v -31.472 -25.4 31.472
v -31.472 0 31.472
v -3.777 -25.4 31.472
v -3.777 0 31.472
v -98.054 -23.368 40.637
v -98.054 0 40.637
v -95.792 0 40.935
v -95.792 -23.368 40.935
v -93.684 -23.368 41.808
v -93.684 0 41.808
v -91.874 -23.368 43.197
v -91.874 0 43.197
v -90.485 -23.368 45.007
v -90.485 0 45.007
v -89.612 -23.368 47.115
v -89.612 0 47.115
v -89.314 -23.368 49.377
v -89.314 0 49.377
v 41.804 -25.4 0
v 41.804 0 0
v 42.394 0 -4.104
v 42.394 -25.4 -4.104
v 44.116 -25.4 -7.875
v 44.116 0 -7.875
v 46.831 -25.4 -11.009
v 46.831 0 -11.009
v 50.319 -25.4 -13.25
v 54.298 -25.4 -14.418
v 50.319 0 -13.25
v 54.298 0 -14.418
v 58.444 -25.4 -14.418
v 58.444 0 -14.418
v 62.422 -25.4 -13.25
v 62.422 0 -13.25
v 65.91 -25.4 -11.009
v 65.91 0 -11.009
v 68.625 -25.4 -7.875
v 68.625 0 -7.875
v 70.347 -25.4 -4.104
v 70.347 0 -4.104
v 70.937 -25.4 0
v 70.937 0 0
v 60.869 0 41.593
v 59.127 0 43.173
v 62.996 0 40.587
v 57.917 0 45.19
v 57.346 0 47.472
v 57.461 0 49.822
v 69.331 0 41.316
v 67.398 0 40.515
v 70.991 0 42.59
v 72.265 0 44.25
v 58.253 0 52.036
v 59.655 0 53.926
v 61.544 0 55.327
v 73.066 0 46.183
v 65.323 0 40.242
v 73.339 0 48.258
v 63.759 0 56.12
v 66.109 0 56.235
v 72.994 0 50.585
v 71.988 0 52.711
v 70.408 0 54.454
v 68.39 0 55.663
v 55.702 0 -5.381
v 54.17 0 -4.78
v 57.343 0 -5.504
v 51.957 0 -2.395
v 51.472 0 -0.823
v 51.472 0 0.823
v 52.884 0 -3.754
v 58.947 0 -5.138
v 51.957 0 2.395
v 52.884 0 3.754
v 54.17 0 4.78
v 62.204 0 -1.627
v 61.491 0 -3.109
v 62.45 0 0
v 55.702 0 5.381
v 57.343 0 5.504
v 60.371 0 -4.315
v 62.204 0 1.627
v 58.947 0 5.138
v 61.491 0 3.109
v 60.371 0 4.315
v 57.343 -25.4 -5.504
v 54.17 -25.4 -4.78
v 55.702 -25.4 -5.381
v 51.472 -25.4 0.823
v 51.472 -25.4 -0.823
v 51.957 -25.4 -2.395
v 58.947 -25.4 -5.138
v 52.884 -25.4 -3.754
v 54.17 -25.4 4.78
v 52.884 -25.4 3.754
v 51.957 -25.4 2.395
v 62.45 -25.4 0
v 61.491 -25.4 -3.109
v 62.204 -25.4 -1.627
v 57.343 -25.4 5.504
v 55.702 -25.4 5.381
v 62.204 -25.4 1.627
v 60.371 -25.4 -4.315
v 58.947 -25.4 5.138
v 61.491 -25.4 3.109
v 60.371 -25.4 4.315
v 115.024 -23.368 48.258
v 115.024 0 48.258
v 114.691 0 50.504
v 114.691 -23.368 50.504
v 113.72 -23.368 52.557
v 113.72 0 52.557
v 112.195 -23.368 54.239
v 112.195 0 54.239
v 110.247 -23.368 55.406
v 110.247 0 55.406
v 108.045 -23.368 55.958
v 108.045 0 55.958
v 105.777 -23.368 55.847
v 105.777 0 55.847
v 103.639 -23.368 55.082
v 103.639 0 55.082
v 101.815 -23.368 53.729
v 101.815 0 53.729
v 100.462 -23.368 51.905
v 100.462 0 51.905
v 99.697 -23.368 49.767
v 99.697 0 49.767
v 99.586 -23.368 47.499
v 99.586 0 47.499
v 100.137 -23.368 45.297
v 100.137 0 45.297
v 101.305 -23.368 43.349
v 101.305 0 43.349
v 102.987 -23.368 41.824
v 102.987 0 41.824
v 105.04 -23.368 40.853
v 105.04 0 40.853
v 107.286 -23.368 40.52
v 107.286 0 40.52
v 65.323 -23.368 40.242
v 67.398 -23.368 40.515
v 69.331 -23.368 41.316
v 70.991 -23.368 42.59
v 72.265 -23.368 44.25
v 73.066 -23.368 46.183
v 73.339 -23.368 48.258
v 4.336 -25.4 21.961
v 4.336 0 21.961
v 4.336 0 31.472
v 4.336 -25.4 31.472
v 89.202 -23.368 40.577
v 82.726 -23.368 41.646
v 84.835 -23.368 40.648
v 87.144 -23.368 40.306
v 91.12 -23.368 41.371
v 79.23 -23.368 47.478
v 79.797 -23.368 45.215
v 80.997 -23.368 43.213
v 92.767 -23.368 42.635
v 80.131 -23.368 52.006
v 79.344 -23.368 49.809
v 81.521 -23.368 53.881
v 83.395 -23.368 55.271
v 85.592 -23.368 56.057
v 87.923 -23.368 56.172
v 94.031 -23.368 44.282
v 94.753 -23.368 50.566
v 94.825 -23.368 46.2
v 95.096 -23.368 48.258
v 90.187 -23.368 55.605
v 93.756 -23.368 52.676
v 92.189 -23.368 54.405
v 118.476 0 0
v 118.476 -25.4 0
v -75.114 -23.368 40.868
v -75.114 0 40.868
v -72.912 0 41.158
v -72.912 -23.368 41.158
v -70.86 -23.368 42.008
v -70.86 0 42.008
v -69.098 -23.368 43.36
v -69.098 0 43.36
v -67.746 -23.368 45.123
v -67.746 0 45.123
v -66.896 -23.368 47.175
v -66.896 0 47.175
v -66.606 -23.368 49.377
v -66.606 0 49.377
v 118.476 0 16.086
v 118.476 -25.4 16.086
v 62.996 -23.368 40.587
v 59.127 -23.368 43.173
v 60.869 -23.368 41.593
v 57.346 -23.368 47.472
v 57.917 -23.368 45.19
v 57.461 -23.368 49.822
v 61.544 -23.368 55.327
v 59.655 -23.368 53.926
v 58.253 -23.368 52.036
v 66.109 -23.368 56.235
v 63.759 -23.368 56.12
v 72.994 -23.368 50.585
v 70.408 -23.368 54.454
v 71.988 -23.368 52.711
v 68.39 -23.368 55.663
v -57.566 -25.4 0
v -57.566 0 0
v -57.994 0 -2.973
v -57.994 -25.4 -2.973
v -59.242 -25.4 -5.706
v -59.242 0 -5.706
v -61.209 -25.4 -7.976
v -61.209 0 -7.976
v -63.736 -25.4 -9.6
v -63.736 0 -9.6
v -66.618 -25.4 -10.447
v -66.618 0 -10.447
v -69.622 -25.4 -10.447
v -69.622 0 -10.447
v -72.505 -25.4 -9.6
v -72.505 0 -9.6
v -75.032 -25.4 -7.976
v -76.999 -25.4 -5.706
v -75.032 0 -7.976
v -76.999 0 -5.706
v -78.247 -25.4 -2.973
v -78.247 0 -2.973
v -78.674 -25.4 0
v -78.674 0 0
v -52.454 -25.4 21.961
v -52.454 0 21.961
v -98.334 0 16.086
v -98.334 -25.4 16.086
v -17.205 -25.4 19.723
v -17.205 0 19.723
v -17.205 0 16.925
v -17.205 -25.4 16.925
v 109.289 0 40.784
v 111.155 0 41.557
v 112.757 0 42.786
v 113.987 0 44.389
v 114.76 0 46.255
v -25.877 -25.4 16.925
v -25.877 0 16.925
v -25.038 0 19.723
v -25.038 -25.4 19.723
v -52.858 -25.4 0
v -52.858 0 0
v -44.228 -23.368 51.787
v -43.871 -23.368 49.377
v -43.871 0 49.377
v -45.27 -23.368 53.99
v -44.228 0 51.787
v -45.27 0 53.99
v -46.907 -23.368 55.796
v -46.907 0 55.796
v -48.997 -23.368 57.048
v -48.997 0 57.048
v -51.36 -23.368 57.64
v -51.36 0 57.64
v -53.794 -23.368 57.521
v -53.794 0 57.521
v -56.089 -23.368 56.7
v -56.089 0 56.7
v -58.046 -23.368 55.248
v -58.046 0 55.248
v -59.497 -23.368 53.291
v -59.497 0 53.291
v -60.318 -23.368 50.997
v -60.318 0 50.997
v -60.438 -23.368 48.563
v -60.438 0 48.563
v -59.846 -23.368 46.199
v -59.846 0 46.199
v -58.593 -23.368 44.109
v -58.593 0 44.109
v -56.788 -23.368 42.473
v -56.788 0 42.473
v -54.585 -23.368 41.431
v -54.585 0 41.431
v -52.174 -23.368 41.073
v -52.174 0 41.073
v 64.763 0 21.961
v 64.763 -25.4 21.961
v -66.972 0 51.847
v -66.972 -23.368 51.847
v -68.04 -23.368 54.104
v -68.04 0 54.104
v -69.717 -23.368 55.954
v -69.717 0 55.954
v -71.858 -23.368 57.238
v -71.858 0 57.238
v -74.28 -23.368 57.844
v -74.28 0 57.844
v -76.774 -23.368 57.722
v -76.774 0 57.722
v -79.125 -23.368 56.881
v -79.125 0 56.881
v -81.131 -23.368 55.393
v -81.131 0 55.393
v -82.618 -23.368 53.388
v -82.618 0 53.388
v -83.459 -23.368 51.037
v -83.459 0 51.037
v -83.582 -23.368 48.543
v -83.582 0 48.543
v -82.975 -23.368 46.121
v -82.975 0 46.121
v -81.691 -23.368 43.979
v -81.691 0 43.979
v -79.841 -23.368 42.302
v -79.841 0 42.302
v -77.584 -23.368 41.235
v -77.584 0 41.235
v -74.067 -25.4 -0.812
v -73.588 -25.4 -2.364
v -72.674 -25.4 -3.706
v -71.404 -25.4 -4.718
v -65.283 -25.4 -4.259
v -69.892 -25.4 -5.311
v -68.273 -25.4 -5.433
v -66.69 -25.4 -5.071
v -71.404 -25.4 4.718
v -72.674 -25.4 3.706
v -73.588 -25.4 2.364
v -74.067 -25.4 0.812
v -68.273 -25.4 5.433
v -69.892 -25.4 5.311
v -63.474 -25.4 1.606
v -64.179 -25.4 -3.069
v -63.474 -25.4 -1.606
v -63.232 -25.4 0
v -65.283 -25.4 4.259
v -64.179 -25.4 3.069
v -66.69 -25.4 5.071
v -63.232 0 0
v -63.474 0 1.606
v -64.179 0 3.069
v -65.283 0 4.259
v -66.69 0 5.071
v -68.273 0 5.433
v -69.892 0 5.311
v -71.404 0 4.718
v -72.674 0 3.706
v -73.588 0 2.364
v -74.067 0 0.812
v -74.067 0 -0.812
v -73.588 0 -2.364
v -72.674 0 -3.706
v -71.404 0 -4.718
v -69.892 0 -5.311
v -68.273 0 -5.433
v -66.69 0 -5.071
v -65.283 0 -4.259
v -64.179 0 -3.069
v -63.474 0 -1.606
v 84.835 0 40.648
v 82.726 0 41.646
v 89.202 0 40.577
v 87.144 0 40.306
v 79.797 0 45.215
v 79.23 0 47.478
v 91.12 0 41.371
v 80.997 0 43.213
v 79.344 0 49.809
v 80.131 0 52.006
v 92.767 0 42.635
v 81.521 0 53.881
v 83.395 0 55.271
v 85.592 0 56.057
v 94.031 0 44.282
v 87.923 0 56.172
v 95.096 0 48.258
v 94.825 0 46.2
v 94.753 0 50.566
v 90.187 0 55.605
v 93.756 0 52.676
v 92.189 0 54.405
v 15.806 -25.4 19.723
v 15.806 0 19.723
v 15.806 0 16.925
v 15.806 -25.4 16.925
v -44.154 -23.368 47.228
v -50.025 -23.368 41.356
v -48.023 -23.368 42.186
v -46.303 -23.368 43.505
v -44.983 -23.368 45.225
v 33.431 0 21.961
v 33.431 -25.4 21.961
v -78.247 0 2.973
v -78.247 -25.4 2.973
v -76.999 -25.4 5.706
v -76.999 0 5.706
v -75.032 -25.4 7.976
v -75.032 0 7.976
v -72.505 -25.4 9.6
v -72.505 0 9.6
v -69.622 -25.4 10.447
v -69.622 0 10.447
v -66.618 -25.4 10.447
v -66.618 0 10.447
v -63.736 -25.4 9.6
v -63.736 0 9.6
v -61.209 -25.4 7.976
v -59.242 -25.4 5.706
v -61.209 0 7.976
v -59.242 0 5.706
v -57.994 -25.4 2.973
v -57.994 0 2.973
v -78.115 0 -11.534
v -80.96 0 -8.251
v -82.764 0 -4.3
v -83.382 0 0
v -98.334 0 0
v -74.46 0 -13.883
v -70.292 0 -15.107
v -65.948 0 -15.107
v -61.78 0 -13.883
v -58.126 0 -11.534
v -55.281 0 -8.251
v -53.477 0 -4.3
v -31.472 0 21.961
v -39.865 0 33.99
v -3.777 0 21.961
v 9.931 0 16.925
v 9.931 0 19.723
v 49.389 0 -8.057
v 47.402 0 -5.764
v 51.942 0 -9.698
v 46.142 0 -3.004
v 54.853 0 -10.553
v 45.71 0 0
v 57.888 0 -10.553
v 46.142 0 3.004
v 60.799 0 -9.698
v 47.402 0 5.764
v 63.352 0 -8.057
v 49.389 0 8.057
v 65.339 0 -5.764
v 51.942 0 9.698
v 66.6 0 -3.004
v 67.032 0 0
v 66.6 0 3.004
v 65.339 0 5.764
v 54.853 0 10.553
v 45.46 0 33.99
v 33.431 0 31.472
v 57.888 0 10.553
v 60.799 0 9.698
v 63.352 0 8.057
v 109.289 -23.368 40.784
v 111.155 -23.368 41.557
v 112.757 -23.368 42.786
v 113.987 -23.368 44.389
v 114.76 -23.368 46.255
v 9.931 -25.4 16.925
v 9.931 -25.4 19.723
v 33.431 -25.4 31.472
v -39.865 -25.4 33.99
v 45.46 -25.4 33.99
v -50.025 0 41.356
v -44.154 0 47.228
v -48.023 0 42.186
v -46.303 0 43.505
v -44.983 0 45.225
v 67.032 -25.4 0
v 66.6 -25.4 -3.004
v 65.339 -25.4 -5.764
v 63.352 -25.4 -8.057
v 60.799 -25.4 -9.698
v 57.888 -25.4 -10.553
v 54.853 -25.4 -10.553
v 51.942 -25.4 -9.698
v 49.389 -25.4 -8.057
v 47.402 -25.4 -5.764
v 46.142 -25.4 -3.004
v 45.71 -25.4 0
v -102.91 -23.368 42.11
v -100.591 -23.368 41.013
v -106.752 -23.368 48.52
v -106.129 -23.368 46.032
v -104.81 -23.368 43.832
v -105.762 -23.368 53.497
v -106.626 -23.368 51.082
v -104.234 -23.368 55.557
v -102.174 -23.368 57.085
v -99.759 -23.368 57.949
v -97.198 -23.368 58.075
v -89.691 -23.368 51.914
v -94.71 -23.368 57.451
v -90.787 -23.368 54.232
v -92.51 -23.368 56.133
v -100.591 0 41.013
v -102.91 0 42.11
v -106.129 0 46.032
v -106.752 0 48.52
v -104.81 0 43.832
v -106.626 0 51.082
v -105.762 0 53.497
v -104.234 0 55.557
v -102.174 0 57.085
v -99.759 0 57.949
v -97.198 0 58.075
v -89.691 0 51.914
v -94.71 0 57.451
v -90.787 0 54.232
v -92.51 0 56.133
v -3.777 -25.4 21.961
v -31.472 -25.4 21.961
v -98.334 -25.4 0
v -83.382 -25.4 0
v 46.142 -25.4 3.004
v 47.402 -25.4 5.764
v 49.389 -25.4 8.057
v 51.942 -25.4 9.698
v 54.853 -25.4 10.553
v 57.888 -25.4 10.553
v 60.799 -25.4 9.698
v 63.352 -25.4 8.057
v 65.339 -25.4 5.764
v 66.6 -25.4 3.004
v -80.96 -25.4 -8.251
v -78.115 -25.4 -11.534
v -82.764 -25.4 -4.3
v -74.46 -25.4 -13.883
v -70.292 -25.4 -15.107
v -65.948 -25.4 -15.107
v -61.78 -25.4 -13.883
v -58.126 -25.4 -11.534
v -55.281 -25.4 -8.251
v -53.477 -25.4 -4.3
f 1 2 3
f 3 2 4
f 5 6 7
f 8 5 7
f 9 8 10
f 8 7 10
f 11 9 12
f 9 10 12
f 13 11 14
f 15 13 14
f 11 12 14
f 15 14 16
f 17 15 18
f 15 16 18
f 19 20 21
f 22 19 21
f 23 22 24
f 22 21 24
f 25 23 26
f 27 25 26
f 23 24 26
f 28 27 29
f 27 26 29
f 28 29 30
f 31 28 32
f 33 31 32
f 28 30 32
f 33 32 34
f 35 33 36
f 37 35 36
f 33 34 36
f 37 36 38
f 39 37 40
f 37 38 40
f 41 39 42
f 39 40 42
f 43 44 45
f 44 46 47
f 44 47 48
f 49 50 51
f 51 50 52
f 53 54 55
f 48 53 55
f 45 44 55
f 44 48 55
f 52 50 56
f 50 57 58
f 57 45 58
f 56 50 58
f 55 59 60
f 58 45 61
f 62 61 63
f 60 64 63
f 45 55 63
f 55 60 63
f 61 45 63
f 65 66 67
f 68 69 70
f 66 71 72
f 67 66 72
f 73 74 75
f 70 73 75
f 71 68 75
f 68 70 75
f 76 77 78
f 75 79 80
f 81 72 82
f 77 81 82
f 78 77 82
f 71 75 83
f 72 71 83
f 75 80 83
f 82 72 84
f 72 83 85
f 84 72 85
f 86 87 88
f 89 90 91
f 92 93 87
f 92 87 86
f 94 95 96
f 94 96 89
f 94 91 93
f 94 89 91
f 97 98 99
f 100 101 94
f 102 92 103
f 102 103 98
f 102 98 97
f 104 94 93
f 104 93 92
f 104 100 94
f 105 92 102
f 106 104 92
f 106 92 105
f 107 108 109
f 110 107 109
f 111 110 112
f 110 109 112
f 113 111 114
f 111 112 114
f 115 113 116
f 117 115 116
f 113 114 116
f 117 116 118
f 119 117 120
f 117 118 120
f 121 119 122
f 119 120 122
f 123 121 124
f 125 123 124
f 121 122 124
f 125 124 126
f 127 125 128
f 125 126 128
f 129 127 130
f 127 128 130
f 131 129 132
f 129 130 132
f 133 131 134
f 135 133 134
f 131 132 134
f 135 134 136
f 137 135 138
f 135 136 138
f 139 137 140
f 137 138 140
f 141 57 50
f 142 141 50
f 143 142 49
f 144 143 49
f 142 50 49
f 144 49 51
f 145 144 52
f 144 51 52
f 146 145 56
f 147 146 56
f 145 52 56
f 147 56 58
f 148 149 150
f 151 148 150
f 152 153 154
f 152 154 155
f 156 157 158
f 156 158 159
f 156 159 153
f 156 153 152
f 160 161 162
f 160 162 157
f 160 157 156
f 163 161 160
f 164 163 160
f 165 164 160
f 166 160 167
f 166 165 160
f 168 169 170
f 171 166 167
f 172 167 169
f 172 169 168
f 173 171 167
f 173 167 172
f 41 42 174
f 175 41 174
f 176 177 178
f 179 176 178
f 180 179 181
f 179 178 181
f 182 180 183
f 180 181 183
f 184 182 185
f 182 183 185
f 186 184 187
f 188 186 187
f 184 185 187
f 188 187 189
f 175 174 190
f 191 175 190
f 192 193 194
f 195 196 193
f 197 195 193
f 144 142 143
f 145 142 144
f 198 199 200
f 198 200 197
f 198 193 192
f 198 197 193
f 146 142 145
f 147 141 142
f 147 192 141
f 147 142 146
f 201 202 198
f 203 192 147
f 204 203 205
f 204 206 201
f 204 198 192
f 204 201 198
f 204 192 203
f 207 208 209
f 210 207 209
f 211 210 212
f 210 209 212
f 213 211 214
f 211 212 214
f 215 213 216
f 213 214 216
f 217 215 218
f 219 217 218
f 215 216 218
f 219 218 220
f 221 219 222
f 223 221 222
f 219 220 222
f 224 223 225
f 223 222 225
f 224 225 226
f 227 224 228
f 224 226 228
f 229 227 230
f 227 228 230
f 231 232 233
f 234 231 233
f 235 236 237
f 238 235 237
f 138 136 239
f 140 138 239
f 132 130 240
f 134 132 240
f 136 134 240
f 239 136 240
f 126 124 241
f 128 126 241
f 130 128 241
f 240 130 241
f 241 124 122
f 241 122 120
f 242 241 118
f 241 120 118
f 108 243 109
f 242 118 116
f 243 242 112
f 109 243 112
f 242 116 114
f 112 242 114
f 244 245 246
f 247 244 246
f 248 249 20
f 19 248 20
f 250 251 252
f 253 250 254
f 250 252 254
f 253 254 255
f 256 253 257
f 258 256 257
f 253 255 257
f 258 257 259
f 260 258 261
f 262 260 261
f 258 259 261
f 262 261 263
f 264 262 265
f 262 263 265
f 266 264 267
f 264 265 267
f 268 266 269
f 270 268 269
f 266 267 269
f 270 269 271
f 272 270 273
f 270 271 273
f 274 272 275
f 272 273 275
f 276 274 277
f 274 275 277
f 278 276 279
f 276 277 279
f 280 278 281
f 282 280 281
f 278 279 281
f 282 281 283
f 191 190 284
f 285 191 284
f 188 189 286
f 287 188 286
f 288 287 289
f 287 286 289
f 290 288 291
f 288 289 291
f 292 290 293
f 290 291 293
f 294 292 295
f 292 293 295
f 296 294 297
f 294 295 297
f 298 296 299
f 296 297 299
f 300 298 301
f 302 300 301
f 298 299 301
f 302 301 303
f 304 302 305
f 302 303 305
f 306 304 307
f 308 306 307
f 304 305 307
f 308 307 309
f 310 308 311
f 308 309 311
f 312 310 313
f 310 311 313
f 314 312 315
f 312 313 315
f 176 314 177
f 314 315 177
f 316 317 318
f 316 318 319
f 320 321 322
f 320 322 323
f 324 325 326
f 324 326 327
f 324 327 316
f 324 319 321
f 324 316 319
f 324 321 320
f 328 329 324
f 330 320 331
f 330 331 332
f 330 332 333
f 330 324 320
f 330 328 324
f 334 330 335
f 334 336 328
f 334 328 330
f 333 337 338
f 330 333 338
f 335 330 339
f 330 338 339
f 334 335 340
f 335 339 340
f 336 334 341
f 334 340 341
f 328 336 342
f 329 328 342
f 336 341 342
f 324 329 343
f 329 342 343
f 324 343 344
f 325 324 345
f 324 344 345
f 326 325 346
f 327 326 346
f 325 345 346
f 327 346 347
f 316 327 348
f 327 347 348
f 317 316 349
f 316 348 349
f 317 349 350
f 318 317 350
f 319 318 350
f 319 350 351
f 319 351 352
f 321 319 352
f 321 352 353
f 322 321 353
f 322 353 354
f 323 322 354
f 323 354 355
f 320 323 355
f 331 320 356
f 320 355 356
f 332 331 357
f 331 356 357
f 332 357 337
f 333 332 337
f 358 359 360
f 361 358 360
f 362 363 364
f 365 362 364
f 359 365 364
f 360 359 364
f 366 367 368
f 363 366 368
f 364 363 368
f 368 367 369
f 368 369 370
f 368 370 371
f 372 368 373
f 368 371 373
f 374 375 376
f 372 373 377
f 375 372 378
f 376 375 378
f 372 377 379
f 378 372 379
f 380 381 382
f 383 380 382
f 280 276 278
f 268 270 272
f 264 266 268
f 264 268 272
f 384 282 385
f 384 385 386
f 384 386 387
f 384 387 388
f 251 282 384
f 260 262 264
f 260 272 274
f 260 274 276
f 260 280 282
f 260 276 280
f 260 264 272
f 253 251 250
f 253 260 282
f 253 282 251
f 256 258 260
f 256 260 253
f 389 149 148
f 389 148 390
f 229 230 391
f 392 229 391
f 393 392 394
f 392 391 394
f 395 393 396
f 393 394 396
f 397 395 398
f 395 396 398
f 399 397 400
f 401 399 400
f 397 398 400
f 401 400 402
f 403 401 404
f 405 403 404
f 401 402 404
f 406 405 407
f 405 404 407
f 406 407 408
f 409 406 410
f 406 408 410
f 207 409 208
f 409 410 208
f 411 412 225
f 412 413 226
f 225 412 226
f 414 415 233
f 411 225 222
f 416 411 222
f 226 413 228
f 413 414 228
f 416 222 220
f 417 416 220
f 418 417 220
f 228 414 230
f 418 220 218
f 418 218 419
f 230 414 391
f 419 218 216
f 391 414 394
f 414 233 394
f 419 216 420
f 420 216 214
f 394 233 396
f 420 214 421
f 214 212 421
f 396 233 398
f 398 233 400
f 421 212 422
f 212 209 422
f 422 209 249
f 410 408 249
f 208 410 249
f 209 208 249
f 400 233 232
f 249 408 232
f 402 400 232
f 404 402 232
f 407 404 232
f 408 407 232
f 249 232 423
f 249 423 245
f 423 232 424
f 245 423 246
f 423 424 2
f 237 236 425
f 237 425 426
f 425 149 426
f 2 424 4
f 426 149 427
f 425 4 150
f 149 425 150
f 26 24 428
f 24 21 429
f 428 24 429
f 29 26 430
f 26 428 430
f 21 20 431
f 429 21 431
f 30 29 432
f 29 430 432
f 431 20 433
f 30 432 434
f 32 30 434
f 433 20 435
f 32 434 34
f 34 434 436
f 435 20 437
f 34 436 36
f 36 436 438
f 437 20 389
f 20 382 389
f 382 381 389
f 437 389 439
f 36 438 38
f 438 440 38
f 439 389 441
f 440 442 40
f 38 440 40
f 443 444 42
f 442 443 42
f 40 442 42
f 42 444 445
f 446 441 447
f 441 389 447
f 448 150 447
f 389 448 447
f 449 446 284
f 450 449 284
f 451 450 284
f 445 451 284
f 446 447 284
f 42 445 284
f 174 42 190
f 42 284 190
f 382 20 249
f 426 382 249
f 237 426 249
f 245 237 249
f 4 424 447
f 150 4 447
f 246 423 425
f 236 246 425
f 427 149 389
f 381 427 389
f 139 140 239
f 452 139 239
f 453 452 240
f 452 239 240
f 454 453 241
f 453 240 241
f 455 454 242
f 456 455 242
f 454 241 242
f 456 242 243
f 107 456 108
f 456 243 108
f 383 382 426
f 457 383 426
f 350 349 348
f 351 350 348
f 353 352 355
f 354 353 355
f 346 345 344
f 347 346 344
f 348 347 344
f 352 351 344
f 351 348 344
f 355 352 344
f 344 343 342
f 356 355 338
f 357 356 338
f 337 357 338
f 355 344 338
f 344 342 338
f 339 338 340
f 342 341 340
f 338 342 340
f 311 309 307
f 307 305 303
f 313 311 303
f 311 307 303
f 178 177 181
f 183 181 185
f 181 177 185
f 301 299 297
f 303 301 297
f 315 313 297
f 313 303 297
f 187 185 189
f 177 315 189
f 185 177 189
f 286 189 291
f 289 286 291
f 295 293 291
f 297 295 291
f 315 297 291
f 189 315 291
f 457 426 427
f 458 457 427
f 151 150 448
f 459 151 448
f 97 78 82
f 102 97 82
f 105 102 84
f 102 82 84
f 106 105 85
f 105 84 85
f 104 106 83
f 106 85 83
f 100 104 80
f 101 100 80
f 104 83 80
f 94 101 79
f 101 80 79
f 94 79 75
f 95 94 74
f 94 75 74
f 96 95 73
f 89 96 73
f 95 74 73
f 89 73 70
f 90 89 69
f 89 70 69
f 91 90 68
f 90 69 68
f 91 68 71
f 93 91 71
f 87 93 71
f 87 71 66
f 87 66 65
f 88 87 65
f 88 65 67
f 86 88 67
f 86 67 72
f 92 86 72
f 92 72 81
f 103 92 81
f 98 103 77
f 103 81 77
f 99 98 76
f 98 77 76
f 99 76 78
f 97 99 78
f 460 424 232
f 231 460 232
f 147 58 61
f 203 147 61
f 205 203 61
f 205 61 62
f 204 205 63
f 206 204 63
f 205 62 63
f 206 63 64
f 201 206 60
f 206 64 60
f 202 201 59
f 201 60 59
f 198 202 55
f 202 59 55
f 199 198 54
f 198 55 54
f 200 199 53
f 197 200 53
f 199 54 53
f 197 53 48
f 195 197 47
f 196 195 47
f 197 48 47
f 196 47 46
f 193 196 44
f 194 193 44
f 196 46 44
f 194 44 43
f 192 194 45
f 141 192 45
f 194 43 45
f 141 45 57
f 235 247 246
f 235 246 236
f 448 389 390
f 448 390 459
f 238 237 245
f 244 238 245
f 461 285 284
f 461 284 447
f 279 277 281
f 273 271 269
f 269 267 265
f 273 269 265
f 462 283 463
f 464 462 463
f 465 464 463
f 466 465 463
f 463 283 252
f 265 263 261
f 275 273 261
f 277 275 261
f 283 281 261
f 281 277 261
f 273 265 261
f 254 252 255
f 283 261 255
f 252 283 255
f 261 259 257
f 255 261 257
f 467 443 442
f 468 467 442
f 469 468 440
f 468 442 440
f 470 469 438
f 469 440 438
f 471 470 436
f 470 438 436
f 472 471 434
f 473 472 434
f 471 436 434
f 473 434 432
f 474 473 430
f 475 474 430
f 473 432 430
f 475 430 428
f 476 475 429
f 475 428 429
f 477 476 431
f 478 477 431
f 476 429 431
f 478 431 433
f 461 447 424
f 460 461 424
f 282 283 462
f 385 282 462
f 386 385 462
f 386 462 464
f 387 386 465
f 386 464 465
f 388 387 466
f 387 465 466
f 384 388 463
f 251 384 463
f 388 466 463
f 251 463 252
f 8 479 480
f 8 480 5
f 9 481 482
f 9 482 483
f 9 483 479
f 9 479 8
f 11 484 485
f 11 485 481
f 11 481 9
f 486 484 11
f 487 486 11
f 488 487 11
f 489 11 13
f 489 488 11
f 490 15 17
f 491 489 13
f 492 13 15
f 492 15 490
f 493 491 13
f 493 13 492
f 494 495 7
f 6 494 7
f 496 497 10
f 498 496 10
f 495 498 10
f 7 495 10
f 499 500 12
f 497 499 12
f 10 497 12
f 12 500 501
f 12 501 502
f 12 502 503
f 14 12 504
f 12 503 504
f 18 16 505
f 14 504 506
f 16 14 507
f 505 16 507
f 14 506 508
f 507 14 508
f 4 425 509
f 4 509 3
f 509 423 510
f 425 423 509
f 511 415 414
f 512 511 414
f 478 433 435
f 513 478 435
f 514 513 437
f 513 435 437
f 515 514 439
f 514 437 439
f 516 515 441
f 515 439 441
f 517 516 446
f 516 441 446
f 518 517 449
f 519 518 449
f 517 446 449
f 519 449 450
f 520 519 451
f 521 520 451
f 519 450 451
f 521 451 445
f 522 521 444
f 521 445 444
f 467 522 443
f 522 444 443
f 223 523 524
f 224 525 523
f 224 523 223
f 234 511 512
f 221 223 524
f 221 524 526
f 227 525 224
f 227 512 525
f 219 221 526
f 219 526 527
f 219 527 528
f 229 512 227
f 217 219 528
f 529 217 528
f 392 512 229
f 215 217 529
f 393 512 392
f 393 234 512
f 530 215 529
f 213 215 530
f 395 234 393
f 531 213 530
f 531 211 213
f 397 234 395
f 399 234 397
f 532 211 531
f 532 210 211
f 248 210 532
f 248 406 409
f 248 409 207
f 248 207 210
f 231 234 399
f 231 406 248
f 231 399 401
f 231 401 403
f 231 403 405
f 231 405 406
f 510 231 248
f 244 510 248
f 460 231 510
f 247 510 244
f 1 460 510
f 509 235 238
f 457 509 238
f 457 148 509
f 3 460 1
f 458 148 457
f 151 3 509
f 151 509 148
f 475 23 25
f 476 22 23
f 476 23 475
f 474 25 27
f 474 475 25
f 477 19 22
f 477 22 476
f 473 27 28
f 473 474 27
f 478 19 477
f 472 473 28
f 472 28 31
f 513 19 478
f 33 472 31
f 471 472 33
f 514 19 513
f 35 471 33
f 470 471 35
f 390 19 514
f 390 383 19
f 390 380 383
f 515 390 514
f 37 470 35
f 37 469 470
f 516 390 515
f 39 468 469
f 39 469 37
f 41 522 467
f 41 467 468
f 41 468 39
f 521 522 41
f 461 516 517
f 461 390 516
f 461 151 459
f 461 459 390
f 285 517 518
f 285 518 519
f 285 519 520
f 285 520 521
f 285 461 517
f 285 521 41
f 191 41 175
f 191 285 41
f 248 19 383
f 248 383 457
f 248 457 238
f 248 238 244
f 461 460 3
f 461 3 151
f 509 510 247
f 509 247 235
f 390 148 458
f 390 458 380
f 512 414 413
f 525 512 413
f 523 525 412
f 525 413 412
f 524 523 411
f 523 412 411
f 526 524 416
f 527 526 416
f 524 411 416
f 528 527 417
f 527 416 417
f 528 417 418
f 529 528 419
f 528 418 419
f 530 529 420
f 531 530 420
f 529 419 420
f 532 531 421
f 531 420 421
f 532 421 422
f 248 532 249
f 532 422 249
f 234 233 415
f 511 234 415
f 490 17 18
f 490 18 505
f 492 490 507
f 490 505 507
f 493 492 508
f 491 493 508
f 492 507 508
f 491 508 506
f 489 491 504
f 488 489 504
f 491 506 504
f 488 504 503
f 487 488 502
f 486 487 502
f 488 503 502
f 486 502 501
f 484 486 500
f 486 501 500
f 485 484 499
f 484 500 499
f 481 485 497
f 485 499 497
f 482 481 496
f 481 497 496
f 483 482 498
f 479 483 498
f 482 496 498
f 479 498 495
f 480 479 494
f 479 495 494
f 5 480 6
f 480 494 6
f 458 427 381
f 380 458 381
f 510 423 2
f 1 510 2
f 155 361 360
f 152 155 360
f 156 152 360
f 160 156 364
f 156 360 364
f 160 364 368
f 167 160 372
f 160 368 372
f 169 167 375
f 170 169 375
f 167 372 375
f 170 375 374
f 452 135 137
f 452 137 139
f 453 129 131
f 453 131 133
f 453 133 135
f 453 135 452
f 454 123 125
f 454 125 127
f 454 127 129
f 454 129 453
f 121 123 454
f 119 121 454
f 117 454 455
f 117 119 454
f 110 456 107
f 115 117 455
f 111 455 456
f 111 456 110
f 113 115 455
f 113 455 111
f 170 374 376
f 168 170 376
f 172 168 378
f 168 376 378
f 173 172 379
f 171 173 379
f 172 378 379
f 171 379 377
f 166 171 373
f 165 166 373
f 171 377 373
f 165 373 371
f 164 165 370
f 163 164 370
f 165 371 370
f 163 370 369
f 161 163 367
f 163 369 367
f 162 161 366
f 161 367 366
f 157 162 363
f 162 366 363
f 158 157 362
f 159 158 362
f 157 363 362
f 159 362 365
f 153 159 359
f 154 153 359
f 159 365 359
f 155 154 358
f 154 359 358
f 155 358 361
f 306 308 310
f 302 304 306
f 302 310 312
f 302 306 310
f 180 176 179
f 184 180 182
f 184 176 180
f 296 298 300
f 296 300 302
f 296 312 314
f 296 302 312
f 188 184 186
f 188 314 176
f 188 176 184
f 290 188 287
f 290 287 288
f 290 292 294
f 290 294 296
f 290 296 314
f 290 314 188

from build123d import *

# Parameters (mm, degrees)
F0_W     = 27.6957710739
F0_H     = 9.5116812736
F0_W_2   = 29.0945479646
F1_DEPTH = 25.4
F2_R     = 5.4480518547
F3_DEPTH = 25.4
F2_R_2   = 5.5194090988
F5_DEPTH = 23.368


with BuildPart() as f1:
    # F0 (on Front) → F1 (new body)
    with BuildSketch(Plane.XZ):
        with BuildLine():
            Line((-52.8583483225, 0), (0, 0))
            Line((0, 0), (41.8039302109, 0))
            ThreePointArc((41.8039302109, 0), (56.3706867397, 14.5667565288), (70.9374432684, 0))
            Line((70.9374432684, 0), (118.4763461351, 0))
            Line((118.4763461351, 0), (118.4763461351, 16.0859264433))
            Line((118.4763461351, 16.0859264433), (64.7633373737, 21.9607856125))
            Line((64.7633373737, 21.9607856125), (45.4602278769, 33.9902602136))
            Line((45.4602278769, 33.9902602136), (-39.8651212454, 33.9902602136))
            Line((-39.8651212454, 33.9902602136), (-52.454110235, 21.9607856125))
            Line((-52.454110235, 21.9607856125), (-98.3339697123, 16.0859264433))
            Line((-98.3339697123, 16.0859264433), (-98.3339697123, 0))
            Line((-98.3339697123, 0), (-83.3824618334, 0))
            ThreePointArc((-83.3824618334, 0), (-68.1204050779, 15.2620567555), (-52.8583483225, 0))
        make_face()
        Polygon((-21.1215214804, 16.9251933694), (-25.8773602545, 16.9251933694), (-25.0380951911, 19.7227448225), (-21.1215214804, 19.7227448225), (-17.2049477696, 19.7227448225), (-17.2049477696, 16.9251933694), align=None, mode=Mode.SUBTRACT)
        with Locations((-17.6245813491, 26.7166262493)):
            Rectangle(F0_W, F0_H, mode=Mode.SUBTRACT)
        Polygon((12.8687415272, 16.9251933694), (9.9313110113, 16.9251933694), (9.9313110113, 19.7227448225), (12.8687415272, 19.7227448225), (15.8061720431, 19.7227448225), (15.8061720431, 16.9251933694), align=None, mode=Mode.SUBTRACT)
        with Locations((18.8834811561, 26.7166262493)):
            Rectangle(F0_W_2, F0_H, mode=Mode.SUBTRACT)
        with BuildLine():
            ThreePointArc((-83.3824618334, 0), (-68.1204050779, -15.2620567555), (-52.8583483225, 0))
            Line((-52.8583483225, 0), (-57.5663627858, 0))
            ThreePointArc((-57.5663627858, 0), (-68.1204050779, -10.5540422922), (-78.6744473701, 0))
            Line((-78.6744473701, 0), (-83.3824618334, 0))
        make_face()
        with BuildLine():
            Line((-57.5663627858, 0), (-52.8583483225, 0))
            ThreePointArc((-52.8583483225, 0), (-68.1204050779, 15.2620567555), (-83.3824618334, 0))
            Line((-83.3824618334, 0), (-78.6744473701, 0))
            ThreePointArc((-78.6744473701, 0), (-68.1204050779, 10.5540422922), (-57.5663627858, 0))
        make_face()
        with BuildLine():
            ThreePointArc((70.9374432684, 0), (56.3706867397, 14.5667565288), (41.8039302109, 0))
            Line((41.8039302109, 0), (45.7096665583, 0))
            ThreePointArc((45.7096665583, 0), (56.3706867397, 10.6610201813), (67.031706921, 0))
            Line((67.031706921, 0), (70.9374432684, 0))
        make_face()
        with BuildLine():
            Line((45.7096665583, 0), (41.8039302109, 0))
            ThreePointArc((41.8039302109, 0), (56.3706867397, -14.5667565288), (70.9374432684, 0))
            Line((70.9374432684, 0), (67.031706921, 0))
            ThreePointArc((67.031706921, 0), (56.3706867397, -10.6610201813), (45.7096665583, 0))
        make_face()
    extrude(amount=F1_DEPTH)


with BuildPart() as f3:
    # F2 (on Front) → F3 (new body)
    with BuildSketch(Plane.XZ):
        with Locations((-68.6799138784, 0)):
            Circle(F2_R)
    extrude(amount=F3_DEPTH)


with BuildPart() as f3b:
    # F2 (on Front) → F3, piece 2 (new body)
    with BuildSketch(Plane.XZ):
        with Locations((56.9301955402, 0)):
            Circle(F2_R_2)
    extrude(amount=F3_DEPTH)


with BuildPart() as f5:
    # F4 (on Front) → F5 (new body)
    with BuildSketch(Plane.XZ):
        with BuildLine():
            ThreePointArc((65.3228461742, 40.2419242431), (70.9909116632, 42.589713841), (73.3387012612, 48.25777933))
            ThreePointArc((73.3387012612, 48.25777933), (59.6547806852, 53.925844819), (65.3228461742, 40.2419242431))
        make_face()
    extrude(amount=F5_DEPTH)


with BuildPart() as f5b:
    # F4 (on Front) → F5, piece 2 (new body)
    with BuildSketch(Plane.XZ):
        with BuildLine():
            ThreePointArc((-52.1743558347, 41.0732052454), (-46.3028272114, 43.505272033), (-43.8707604238, 49.3768006563))
            ThreePointArc((-43.8707604238, 49.3768006563), (-58.045884458, 55.2483292796), (-52.1743558347, 41.0732052454))
        make_face()
    extrude(amount=F5_DEPTH)


with BuildPart() as f5c:
    # F4 (on Front) → F5, piece 3 (new body)
    with BuildSketch(Plane.XZ):
        with BuildLine():
            ThreePointArc((-75.1142799854, 40.8683843656), (-69.0979211291, 43.3604418), (-66.6058636947, 49.3768006563))
            ThreePointArc((-66.6058636947, 49.3768006563), (-81.1306388418, 55.3931595127), (-75.1142799854, 40.8683843656))
        make_face()
    extrude(amount=F5_DEPTH)


with BuildPart() as f5d:
    # F4 (on Front) → F5, piece 4 (new body)
    with BuildSketch(Plane.XZ):
        with BuildLine():
            ThreePointArc((-98.054215312, 40.6369699519), (-91.8742217545, 43.1968070988), (-89.3143846076, 49.3768006563))
            ThreePointArc((-89.3143846076, 49.3768006563), (-104.2342088695, 55.5567942138), (-98.054215312, 40.6369699519))
        make_face()
    extrude(amount=F5_DEPTH)


with BuildPart() as f5e:
    # F4 (on Front) → F5, piece 5 (new body)
    with BuildSketch(Plane.XZ):
        with BuildLine():
            ThreePointArc((87.1437564492, 40.3056413085), (92.7667671692, 42.6347686101), (95.0958944708, 48.25777933))
            ThreePointArc((95.0958944708, 48.25777933), (81.5207457293, 53.88079005), (87.1437564492, 40.3056413085))
        make_face()
    extrude(amount=F5_DEPTH)


with BuildPart() as f5f:
    # F4 (on Front) → F5, piece 6 (new body)
    with BuildSketch(Plane.XZ):
        with BuildLine():
            ThreePointArc((107.2861403227, 40.5201339279), (112.7574818569, 42.7864377958), (115.0237857248, 48.25777933))
            ThreePointArc((115.0237857248, 48.25777933), (101.8147987884, 53.7291208643), (107.2861403227, 40.5201339279))
        make_face()
    extrude(amount=F5_DEPTH)


solid = Compound([f1.part, f3.part, f3b.part, f5.part, f5b.part, f5c.part, f5d.part, f5e.part, f5f.part])
